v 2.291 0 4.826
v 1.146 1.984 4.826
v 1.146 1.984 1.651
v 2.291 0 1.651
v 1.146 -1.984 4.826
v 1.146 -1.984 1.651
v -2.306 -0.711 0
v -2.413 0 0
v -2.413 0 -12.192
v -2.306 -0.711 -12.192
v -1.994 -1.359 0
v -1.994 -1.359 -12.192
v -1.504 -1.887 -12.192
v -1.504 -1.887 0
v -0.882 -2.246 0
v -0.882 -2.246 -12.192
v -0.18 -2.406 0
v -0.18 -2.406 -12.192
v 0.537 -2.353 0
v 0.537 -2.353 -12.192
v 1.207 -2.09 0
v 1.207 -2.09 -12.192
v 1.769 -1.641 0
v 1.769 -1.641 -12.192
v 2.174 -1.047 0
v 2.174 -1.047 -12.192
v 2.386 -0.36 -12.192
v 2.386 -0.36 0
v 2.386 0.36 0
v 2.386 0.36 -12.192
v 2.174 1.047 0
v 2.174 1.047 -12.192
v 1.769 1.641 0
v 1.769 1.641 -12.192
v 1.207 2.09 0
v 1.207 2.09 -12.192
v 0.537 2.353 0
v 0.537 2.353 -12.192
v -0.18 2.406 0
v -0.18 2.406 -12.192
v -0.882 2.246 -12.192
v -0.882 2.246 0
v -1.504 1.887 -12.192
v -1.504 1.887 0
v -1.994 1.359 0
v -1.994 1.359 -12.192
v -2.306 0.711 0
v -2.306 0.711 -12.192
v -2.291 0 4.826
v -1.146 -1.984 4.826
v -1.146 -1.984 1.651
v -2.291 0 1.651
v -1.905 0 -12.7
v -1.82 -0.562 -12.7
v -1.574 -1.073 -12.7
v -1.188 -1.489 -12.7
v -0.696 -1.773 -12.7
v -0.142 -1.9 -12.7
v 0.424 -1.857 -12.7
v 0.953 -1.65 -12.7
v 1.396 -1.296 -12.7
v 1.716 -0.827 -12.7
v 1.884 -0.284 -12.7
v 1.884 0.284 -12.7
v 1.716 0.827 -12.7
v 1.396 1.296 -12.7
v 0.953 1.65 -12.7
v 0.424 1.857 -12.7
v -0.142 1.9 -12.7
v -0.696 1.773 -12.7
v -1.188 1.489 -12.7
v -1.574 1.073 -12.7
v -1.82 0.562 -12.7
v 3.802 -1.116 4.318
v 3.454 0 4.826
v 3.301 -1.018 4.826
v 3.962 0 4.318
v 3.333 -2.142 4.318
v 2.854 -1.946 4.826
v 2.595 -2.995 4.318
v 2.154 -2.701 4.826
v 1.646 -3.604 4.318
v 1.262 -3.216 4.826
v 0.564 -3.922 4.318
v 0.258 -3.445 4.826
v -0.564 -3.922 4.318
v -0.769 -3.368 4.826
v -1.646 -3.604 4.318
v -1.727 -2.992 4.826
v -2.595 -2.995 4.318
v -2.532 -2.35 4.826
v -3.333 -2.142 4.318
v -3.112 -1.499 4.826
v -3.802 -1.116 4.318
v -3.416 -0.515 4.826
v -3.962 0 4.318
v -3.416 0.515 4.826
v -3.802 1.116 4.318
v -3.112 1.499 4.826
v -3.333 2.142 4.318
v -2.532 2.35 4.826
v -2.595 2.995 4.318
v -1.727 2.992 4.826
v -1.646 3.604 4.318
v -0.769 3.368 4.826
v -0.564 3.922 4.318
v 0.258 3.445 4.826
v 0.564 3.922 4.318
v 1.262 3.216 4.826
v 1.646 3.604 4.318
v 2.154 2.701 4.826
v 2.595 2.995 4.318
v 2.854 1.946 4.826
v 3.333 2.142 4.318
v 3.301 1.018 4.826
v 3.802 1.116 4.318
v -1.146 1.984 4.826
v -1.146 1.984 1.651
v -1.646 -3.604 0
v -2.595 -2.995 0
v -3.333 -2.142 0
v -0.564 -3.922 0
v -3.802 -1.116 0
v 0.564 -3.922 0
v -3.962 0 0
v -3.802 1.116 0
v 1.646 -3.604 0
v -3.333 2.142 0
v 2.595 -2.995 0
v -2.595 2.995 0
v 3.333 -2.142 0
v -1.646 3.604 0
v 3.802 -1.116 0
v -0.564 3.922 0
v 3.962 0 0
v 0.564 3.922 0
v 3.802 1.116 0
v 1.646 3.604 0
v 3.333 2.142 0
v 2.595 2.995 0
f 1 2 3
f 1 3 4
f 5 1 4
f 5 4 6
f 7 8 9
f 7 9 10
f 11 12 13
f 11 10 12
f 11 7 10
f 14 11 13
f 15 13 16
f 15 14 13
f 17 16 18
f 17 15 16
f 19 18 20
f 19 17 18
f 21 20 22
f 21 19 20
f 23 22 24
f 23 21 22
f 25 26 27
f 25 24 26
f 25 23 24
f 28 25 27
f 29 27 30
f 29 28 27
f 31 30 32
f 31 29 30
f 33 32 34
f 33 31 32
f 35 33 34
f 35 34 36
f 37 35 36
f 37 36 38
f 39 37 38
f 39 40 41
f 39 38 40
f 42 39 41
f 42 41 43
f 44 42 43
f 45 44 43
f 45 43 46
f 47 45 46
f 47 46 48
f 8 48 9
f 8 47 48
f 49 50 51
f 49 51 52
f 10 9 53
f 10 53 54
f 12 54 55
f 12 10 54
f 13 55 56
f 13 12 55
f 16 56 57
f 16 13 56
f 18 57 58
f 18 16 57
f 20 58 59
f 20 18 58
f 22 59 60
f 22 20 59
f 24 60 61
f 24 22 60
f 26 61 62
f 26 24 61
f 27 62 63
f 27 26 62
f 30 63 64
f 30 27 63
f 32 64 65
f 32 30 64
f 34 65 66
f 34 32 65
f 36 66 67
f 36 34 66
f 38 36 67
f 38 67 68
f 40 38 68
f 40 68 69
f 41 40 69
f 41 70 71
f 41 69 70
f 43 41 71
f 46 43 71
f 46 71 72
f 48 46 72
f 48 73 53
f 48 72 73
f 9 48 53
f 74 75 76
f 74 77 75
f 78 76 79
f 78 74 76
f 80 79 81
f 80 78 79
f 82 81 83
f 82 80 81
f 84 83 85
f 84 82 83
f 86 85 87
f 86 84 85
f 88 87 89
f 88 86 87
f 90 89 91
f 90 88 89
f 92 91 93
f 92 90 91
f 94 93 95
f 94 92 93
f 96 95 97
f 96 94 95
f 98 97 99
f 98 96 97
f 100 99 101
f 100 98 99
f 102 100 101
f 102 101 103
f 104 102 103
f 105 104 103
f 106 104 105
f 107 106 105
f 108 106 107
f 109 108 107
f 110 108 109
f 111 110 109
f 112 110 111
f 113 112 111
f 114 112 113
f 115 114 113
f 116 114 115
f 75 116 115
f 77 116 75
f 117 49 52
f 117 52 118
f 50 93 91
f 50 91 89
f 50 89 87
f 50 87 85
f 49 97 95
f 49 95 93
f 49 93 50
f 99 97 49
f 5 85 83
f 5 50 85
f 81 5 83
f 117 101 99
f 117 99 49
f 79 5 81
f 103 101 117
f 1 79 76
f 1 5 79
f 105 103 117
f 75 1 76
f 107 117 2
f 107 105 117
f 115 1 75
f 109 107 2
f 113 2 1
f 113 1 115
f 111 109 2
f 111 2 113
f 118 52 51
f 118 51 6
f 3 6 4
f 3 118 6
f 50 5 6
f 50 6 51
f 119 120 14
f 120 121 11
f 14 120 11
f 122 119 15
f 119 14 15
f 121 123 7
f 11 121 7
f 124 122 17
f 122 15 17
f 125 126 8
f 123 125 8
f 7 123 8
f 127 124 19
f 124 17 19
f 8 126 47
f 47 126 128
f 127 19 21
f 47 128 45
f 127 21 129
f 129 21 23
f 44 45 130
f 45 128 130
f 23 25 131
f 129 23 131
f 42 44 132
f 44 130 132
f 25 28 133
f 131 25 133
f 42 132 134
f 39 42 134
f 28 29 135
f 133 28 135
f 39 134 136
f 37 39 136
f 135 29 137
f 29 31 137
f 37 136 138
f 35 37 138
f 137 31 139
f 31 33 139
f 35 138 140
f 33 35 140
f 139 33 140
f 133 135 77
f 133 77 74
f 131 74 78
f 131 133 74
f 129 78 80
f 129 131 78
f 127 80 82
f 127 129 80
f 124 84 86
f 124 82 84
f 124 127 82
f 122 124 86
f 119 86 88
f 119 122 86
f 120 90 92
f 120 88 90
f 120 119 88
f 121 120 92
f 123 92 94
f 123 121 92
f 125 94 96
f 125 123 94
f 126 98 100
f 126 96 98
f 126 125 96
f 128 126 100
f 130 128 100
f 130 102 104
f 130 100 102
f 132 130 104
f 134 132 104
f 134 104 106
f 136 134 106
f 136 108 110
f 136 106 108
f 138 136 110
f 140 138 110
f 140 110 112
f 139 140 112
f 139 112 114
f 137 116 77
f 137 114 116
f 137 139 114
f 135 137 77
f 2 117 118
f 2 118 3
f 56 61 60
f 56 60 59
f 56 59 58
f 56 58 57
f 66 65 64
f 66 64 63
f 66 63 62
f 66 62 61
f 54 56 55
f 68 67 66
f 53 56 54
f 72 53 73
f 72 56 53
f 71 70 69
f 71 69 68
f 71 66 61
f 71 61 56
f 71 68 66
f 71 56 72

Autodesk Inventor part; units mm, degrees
ref_plane "YZ Plane" through (0, 0, 0) normal (1, 0, 0) x (0, 1, 0)
ref_plane "XZ Plane" through (0, 0, 0) normal (0, 1, 0) x (-1, 0, 0)
ref_plane "XY Plane" through (0, 0, 0) normal (0, 0, 1) x (1, 0, 0)
sketch "Sketch1" plane through (0, 0, 0) normal (0, 0, 1) x (1, 0, 0)
  circle A0 centre (0, 0) radius 3.9624
  dimension "d0" = 7.9248
extrude "Extrusion1" add sketch "Sketch1" along normal blind 4.826
sketch "Sketch2" plane through (0, 0, 0) normal (0, 0, -1) x (-1, 0, 0)
  circle A0 centre (0, 0) radius 3.9624 projected
  circle A1 centre (0, 0) radius 2.413
  dimension "d3" = 4.826
extrude "Extrusion2" add sketch "Sketch2" along normal blind 12.7 contours A1
sketch "Sketch3" plane through (0, 0, 4.826) normal (0, 0, 1) x (1, 0, 0)
  circle A0 centre (0, 0) radius 3.9624 projected
  line L0 (-1.1457, 1.9844) -> (1.1457, 1.9844)
  line L1 (1.1457, 1.9844) -> (2.2914, 0)
  line L2 (2.2914, 0) -> (1.1457, -1.9844)
  line L3 (1.1457, -1.9844) -> (-1.1457, -1.9844)
  line L4 (-1.1457, -1.9844) -> (-2.2914, 0)
  line L5 (-2.2914, 0) -> (-1.1457, 1.9844)
  dimension "d6" = 3.9688
extrude "Extrusion3" cut sketch "Sketch3" against normal blind 3.175 contours L0 L1 L2 L3 L4 L5
thread "Thread1" size "10-32 UNF" class "2A" standard "ANSI Unified Screw Threads" full length
chamfer "Chamfer1" distance 0.508 angle 45 1 edges at (2.413, 0, -12.7)
chamfer "Chamfer2" distance 0.508 angle 45 1 edges at (-3.9624, 0, 4.826)
properties part number "10-32 x1000" material "Steel"
